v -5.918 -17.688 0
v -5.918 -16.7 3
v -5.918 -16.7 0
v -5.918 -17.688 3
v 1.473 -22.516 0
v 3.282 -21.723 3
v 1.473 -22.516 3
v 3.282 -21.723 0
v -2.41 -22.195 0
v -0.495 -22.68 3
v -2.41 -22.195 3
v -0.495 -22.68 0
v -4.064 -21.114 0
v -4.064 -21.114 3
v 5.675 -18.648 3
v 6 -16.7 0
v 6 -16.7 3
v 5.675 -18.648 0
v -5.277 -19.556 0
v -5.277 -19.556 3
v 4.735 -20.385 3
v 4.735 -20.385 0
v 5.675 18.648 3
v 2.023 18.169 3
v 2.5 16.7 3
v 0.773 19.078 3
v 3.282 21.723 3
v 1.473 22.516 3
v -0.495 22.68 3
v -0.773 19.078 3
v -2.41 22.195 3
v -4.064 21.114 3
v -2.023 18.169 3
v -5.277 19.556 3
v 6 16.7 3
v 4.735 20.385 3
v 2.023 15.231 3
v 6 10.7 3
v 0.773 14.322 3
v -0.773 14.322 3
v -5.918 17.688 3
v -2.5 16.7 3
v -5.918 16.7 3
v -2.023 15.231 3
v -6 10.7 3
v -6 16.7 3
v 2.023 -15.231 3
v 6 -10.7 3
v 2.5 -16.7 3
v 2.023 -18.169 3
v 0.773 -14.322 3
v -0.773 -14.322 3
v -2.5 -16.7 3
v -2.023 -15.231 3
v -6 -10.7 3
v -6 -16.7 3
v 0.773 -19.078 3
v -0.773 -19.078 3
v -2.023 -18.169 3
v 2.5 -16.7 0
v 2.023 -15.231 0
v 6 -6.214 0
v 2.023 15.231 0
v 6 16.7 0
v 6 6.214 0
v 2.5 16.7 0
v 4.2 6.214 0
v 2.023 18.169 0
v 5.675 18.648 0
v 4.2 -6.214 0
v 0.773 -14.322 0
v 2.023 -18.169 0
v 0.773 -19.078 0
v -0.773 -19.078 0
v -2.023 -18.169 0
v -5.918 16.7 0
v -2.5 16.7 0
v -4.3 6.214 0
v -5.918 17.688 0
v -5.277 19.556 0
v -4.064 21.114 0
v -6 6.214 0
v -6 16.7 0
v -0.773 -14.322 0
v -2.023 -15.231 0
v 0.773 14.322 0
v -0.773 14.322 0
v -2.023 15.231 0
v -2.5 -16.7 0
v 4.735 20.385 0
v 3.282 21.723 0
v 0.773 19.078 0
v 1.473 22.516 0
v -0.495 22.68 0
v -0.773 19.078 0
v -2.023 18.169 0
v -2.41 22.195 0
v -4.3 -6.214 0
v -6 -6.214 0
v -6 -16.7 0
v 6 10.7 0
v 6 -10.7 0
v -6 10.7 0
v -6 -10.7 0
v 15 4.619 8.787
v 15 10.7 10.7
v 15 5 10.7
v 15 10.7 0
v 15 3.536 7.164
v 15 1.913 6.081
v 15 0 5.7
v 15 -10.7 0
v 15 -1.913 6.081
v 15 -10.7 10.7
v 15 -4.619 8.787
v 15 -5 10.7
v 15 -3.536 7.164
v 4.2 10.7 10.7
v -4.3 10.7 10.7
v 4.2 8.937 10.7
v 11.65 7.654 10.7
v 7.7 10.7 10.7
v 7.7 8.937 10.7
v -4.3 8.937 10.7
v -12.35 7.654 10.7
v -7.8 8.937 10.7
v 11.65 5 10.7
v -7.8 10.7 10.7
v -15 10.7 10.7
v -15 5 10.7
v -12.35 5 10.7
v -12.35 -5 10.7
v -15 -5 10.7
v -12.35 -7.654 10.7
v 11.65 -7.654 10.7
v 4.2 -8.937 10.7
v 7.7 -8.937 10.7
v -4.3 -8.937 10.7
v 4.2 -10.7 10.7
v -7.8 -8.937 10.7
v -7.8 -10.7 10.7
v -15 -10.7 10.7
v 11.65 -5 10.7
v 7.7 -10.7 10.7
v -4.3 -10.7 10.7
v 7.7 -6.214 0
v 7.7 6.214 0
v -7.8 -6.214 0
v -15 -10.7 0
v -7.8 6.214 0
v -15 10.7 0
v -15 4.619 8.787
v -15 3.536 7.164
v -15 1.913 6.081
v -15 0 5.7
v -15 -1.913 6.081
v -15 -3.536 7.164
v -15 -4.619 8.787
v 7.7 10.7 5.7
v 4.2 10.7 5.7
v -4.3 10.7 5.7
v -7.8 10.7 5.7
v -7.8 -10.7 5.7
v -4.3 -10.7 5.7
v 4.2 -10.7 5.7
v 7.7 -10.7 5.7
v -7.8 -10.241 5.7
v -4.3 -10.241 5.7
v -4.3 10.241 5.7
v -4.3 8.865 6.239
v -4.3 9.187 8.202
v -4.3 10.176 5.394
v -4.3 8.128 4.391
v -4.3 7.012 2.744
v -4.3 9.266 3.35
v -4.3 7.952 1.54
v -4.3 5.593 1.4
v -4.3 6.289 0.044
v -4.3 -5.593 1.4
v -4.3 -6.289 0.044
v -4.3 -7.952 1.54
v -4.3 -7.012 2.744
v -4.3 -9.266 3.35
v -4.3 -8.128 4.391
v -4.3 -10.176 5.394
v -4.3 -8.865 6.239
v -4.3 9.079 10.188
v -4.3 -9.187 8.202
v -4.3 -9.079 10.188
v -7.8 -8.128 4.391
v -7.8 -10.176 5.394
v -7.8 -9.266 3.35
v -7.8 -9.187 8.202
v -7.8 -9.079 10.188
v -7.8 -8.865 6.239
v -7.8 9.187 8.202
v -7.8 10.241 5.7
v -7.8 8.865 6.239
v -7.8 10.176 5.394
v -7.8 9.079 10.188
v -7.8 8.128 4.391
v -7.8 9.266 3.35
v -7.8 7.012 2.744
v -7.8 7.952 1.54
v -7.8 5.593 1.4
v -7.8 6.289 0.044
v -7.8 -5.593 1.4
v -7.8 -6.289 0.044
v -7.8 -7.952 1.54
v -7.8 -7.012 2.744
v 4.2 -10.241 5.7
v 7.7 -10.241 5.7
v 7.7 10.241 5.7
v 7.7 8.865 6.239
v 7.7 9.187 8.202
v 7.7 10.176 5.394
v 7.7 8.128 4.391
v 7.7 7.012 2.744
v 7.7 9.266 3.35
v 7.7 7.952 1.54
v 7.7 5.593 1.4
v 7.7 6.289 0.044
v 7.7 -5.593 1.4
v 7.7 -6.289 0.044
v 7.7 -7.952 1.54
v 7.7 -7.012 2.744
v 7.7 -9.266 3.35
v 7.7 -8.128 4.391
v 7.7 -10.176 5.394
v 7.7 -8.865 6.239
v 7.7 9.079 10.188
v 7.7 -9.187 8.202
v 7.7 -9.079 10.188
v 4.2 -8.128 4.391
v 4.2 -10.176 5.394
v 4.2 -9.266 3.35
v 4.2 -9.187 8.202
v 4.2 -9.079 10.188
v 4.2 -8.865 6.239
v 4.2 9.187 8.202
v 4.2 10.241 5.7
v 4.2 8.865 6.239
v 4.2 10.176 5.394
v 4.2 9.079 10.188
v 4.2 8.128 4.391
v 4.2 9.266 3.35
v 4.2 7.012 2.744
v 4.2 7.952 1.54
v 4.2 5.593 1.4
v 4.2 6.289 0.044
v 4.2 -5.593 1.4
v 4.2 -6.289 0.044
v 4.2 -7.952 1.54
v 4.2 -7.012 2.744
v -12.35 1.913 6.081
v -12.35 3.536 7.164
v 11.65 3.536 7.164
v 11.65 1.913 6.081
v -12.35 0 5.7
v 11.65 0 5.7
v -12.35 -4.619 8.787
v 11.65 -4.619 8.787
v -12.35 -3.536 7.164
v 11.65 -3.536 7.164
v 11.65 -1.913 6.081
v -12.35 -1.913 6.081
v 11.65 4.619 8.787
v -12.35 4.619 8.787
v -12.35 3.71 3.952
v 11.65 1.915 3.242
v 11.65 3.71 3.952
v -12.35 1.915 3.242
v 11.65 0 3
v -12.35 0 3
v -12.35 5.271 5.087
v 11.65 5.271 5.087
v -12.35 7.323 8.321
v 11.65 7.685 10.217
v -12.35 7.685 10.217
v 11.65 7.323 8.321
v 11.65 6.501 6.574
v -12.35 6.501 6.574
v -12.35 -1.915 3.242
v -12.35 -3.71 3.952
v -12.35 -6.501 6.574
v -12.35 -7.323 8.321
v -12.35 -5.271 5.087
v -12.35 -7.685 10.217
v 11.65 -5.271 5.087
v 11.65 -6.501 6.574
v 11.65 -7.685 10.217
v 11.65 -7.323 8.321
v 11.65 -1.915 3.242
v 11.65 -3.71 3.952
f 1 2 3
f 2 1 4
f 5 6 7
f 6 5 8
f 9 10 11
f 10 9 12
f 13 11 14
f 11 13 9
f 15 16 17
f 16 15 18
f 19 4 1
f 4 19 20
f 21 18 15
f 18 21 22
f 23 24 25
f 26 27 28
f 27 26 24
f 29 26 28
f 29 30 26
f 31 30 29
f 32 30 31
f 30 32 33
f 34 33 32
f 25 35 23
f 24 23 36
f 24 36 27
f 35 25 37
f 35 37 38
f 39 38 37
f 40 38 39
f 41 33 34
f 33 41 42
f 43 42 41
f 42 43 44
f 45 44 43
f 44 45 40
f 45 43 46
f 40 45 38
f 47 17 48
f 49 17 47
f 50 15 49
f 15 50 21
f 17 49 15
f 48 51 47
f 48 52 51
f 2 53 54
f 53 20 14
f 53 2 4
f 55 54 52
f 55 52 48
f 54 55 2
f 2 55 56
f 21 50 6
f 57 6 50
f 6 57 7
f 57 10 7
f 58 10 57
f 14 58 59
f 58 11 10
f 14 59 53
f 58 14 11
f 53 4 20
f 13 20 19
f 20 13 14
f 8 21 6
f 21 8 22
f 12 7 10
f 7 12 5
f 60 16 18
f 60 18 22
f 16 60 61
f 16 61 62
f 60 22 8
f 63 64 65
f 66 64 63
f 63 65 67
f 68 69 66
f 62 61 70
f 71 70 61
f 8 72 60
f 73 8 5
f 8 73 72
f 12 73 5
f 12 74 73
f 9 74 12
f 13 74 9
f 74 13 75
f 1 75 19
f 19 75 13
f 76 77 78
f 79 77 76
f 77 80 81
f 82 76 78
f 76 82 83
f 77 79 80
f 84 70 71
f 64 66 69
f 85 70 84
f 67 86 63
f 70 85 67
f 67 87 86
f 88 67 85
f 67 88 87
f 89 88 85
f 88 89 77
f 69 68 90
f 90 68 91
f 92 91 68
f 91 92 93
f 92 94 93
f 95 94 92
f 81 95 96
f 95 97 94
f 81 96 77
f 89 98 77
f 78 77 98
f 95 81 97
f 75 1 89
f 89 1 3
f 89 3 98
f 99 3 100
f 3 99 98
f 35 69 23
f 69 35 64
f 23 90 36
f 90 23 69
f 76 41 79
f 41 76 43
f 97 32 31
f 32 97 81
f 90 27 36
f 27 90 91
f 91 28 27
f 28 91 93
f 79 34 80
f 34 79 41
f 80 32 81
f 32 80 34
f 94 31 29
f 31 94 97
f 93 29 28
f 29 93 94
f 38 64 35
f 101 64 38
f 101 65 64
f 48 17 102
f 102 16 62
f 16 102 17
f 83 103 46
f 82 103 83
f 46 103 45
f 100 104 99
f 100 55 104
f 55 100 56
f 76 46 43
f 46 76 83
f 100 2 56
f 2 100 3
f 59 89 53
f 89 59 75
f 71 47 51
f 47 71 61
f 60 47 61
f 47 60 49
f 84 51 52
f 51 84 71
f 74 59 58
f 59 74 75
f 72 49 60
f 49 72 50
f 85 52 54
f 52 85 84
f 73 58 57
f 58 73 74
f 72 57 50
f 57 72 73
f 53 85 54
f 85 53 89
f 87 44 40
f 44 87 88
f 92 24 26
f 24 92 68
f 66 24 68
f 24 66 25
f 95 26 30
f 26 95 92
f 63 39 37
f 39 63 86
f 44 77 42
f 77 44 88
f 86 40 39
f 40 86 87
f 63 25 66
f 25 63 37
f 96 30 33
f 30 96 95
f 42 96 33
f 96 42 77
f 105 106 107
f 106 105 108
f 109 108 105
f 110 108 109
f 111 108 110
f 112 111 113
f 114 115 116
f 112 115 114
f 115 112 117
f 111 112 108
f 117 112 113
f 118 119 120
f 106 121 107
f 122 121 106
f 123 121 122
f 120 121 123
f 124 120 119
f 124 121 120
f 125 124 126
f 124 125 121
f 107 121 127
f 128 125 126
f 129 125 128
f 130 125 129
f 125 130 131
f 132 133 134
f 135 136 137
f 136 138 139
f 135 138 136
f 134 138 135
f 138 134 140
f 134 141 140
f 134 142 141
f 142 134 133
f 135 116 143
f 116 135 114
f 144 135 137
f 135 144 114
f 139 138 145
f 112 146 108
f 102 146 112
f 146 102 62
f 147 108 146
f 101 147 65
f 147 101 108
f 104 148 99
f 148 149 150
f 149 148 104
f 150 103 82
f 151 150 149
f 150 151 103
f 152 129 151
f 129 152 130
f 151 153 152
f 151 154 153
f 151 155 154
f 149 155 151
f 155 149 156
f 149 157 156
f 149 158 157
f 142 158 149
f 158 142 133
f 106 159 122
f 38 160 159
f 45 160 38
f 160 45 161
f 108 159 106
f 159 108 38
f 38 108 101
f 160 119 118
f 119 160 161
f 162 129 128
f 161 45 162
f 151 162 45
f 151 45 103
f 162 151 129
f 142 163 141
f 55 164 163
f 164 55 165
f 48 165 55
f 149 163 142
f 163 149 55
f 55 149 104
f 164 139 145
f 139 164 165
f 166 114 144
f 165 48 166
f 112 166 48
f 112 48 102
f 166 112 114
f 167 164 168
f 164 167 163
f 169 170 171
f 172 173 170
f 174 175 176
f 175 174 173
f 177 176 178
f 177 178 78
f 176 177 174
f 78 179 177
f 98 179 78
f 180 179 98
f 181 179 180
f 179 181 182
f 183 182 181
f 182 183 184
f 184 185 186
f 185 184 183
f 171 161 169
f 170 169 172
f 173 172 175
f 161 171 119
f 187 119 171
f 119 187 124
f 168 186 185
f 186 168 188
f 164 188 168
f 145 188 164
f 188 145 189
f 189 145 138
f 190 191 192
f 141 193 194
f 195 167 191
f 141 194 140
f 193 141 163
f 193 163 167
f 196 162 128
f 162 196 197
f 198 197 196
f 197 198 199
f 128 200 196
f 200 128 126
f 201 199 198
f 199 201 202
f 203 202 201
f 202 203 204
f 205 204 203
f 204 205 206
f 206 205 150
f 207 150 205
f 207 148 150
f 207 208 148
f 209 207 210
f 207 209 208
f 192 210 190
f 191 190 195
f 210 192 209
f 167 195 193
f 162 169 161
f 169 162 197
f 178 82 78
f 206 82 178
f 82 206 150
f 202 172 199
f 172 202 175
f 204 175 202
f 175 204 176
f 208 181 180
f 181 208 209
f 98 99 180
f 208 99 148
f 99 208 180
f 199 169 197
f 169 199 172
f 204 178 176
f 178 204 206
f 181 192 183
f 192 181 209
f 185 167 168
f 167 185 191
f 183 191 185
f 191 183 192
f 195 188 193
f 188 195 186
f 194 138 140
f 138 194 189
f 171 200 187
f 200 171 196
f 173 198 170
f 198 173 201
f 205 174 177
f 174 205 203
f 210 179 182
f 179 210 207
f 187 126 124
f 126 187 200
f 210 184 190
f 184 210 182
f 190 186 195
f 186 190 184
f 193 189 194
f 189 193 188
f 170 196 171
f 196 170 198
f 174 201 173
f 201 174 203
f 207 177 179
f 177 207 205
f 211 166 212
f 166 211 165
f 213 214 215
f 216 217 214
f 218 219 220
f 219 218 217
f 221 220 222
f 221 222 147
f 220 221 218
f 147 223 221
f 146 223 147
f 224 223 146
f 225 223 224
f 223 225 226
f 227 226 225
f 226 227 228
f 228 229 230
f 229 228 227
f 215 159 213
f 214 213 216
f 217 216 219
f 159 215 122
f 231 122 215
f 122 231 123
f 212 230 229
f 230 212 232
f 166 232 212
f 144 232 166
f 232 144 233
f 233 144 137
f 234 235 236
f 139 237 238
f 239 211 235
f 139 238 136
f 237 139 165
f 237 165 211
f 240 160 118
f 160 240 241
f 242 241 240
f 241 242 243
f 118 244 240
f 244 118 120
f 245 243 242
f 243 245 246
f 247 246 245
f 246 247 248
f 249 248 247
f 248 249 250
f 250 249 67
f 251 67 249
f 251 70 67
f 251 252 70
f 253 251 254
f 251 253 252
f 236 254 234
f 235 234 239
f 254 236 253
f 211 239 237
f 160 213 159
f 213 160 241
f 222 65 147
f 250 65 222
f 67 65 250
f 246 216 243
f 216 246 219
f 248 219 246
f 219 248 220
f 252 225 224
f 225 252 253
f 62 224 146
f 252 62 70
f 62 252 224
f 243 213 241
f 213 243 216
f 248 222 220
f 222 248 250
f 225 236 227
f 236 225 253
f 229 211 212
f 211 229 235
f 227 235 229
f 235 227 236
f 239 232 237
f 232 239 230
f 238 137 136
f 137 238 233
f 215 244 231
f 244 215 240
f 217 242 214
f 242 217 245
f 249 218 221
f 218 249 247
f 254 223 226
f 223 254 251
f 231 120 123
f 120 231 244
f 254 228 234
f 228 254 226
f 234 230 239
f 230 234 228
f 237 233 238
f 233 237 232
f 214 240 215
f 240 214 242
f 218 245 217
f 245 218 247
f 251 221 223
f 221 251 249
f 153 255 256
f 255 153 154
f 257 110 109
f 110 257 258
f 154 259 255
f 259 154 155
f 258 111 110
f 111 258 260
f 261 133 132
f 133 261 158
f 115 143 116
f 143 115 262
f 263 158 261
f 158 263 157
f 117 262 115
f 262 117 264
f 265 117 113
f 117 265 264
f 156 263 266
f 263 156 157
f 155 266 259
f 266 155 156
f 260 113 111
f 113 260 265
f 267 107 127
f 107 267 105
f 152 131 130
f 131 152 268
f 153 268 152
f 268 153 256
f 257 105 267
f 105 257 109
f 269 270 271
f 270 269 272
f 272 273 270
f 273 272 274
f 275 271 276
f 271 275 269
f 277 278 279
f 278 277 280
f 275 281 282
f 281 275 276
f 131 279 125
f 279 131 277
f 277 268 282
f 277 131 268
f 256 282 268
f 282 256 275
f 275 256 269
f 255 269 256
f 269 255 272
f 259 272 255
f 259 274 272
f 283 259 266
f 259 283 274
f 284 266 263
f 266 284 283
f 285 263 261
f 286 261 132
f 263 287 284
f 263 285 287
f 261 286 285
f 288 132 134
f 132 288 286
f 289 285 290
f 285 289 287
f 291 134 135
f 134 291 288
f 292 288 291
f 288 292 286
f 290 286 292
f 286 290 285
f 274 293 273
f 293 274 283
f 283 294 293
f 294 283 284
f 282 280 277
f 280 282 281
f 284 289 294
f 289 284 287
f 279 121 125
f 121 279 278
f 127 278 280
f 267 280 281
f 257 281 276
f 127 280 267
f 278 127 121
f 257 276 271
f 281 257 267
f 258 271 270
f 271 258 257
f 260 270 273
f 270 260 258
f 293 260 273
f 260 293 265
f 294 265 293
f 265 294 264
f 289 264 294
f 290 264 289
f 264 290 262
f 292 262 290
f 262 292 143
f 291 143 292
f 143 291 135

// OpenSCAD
// LM8UU holder module, zip tie model
// Yes, another one
// John Ridley
// September 3 2012


// set up all this junk as globals for compatibility with some other objects

LM8UU_dia = 15.4; 
LM8UU_length = 24;
rod_dia = 10;

//screw/nut dimensions (M3) - hexagon socket head cap screw ISO 4762, hexagon nut ISO 4032
screw_thread_dia_iso = 3.5;
screw_head_dia_iso = 6.5;
nut_wrench_size_iso = 7.95;


// screw/nut dimensions for use (plus clearance for fitting purpose)
clearance_dia = 0.5;
screw_thread_dia = screw_thread_dia_iso + clearance_dia;
screw_head_dia = screw_head_dia_iso + clearance_dia;
nut_wrench_size = nut_wrench_size_iso + clearance_dia;
nut_dia_perimeter = (nut_wrench_size/cos(30));
nut_dia = nut_dia_perimeter;
nut_surround_thickness = 2;

// main body dimensions
body_wall_thickness = 3;
body_width = LM8UU_dia + (2*body_wall_thickness);
body_height = LM8UU_dia/2 + body_wall_thickness;
body_length = LM8UU_length + (2*body_wall_thickness);


///////////////////////////////////////////////////////////////////////////////////////////
// use this to create a bare holder (change false to true)
if (true)
{
 LM8UU_holder(
 	tab_length = 12,
 	tab_width = 12,
 	tab_screw_dia = 5);
}
///////////////////////////////////////////////////////////////////////////////////////////

module LM8UU_holder(
	bearing_dia = LM8UU_dia, 
	bearing_len = LM8UU_length, 
	shaft_dia = rod_dia, 
	border = body_wall_thickness, 
	zip_width = 3.5,
	zip_height = 1.5,
	tab_length = 0, 
	tab_width = 0, 
	tab_screw_dia = 0)
{
	zip_offset = 2;

	translate([0,0,(bearing_dia/2+border)/2])
	difference()
	{
		union ()
		{
			cube([bearing_len + border*2, bearing_dia + border*2, bearing_dia/2 + border], center = true);
			if (tab_length > 0)
			{
				difference()
				{
					translate([0,0,-(bearing_dia/2)/2])
					{
						union ()
						{
							cube([tab_width, tab_length + bearing_dia + border*2, border], center=true);

							for (i=[-1,1])
							{
								translate([0,(bearing_dia/2 + border + tab_length/2)*i, -border/2])
									cylinder(r=tab_width/2, h=border);
							}
						}
					}

					for (i=[-1,1])
					{
						translate([0,(bearing_dia/2 + border + tab_length/2)*i, -(bearing_dia/2 + border)/2 - 0.1] )
							cylinder(r=tab_screw_dia / 2, h=border+0.1, $fn=10);
					}
				}
			}
		}
		translate([-(bearing_len/2 + border+0.05), 0, (bearing_dia/2+border)/2])
		rotate([0,90,0])
		union()
		{
			cylinder(r=shaft_dia/2, h=bearing_len + border*2+0.1);
			translate([0,0,(bearing_dia - shaft_dia)/2])
				cylinder(r=bearing_dia/2, h=bearing_len);

			// zip tie channels
			for (i=[-1,1])
			{
				translate([0,0,bearing_len/2+border-zip_width/2 + bearing_len/4 * i])
				{
					translate([(bearing_dia/2+border-zip_height/2+0.1), 0, zip_width/2])
						cube([zip_height, 12, zip_width], center=true);
					for (j=[-1,1])
					{
						translate([0,j*(bearing_dia/2+border-zip_height/2), zip_width/2])
							cube([10,zip_height, zip_width], center=true);
					}
					translate([zip_offset,0,0]) //bearing_len/2 + border])
					difference ()
					{
						cylinder(r=bearing_dia/2 + border, h=zip_width);
						cylinder(r=bearing_dia/2 + border - zip_height, h=zip_width);
					}
				}
			}
		}
	}
}
